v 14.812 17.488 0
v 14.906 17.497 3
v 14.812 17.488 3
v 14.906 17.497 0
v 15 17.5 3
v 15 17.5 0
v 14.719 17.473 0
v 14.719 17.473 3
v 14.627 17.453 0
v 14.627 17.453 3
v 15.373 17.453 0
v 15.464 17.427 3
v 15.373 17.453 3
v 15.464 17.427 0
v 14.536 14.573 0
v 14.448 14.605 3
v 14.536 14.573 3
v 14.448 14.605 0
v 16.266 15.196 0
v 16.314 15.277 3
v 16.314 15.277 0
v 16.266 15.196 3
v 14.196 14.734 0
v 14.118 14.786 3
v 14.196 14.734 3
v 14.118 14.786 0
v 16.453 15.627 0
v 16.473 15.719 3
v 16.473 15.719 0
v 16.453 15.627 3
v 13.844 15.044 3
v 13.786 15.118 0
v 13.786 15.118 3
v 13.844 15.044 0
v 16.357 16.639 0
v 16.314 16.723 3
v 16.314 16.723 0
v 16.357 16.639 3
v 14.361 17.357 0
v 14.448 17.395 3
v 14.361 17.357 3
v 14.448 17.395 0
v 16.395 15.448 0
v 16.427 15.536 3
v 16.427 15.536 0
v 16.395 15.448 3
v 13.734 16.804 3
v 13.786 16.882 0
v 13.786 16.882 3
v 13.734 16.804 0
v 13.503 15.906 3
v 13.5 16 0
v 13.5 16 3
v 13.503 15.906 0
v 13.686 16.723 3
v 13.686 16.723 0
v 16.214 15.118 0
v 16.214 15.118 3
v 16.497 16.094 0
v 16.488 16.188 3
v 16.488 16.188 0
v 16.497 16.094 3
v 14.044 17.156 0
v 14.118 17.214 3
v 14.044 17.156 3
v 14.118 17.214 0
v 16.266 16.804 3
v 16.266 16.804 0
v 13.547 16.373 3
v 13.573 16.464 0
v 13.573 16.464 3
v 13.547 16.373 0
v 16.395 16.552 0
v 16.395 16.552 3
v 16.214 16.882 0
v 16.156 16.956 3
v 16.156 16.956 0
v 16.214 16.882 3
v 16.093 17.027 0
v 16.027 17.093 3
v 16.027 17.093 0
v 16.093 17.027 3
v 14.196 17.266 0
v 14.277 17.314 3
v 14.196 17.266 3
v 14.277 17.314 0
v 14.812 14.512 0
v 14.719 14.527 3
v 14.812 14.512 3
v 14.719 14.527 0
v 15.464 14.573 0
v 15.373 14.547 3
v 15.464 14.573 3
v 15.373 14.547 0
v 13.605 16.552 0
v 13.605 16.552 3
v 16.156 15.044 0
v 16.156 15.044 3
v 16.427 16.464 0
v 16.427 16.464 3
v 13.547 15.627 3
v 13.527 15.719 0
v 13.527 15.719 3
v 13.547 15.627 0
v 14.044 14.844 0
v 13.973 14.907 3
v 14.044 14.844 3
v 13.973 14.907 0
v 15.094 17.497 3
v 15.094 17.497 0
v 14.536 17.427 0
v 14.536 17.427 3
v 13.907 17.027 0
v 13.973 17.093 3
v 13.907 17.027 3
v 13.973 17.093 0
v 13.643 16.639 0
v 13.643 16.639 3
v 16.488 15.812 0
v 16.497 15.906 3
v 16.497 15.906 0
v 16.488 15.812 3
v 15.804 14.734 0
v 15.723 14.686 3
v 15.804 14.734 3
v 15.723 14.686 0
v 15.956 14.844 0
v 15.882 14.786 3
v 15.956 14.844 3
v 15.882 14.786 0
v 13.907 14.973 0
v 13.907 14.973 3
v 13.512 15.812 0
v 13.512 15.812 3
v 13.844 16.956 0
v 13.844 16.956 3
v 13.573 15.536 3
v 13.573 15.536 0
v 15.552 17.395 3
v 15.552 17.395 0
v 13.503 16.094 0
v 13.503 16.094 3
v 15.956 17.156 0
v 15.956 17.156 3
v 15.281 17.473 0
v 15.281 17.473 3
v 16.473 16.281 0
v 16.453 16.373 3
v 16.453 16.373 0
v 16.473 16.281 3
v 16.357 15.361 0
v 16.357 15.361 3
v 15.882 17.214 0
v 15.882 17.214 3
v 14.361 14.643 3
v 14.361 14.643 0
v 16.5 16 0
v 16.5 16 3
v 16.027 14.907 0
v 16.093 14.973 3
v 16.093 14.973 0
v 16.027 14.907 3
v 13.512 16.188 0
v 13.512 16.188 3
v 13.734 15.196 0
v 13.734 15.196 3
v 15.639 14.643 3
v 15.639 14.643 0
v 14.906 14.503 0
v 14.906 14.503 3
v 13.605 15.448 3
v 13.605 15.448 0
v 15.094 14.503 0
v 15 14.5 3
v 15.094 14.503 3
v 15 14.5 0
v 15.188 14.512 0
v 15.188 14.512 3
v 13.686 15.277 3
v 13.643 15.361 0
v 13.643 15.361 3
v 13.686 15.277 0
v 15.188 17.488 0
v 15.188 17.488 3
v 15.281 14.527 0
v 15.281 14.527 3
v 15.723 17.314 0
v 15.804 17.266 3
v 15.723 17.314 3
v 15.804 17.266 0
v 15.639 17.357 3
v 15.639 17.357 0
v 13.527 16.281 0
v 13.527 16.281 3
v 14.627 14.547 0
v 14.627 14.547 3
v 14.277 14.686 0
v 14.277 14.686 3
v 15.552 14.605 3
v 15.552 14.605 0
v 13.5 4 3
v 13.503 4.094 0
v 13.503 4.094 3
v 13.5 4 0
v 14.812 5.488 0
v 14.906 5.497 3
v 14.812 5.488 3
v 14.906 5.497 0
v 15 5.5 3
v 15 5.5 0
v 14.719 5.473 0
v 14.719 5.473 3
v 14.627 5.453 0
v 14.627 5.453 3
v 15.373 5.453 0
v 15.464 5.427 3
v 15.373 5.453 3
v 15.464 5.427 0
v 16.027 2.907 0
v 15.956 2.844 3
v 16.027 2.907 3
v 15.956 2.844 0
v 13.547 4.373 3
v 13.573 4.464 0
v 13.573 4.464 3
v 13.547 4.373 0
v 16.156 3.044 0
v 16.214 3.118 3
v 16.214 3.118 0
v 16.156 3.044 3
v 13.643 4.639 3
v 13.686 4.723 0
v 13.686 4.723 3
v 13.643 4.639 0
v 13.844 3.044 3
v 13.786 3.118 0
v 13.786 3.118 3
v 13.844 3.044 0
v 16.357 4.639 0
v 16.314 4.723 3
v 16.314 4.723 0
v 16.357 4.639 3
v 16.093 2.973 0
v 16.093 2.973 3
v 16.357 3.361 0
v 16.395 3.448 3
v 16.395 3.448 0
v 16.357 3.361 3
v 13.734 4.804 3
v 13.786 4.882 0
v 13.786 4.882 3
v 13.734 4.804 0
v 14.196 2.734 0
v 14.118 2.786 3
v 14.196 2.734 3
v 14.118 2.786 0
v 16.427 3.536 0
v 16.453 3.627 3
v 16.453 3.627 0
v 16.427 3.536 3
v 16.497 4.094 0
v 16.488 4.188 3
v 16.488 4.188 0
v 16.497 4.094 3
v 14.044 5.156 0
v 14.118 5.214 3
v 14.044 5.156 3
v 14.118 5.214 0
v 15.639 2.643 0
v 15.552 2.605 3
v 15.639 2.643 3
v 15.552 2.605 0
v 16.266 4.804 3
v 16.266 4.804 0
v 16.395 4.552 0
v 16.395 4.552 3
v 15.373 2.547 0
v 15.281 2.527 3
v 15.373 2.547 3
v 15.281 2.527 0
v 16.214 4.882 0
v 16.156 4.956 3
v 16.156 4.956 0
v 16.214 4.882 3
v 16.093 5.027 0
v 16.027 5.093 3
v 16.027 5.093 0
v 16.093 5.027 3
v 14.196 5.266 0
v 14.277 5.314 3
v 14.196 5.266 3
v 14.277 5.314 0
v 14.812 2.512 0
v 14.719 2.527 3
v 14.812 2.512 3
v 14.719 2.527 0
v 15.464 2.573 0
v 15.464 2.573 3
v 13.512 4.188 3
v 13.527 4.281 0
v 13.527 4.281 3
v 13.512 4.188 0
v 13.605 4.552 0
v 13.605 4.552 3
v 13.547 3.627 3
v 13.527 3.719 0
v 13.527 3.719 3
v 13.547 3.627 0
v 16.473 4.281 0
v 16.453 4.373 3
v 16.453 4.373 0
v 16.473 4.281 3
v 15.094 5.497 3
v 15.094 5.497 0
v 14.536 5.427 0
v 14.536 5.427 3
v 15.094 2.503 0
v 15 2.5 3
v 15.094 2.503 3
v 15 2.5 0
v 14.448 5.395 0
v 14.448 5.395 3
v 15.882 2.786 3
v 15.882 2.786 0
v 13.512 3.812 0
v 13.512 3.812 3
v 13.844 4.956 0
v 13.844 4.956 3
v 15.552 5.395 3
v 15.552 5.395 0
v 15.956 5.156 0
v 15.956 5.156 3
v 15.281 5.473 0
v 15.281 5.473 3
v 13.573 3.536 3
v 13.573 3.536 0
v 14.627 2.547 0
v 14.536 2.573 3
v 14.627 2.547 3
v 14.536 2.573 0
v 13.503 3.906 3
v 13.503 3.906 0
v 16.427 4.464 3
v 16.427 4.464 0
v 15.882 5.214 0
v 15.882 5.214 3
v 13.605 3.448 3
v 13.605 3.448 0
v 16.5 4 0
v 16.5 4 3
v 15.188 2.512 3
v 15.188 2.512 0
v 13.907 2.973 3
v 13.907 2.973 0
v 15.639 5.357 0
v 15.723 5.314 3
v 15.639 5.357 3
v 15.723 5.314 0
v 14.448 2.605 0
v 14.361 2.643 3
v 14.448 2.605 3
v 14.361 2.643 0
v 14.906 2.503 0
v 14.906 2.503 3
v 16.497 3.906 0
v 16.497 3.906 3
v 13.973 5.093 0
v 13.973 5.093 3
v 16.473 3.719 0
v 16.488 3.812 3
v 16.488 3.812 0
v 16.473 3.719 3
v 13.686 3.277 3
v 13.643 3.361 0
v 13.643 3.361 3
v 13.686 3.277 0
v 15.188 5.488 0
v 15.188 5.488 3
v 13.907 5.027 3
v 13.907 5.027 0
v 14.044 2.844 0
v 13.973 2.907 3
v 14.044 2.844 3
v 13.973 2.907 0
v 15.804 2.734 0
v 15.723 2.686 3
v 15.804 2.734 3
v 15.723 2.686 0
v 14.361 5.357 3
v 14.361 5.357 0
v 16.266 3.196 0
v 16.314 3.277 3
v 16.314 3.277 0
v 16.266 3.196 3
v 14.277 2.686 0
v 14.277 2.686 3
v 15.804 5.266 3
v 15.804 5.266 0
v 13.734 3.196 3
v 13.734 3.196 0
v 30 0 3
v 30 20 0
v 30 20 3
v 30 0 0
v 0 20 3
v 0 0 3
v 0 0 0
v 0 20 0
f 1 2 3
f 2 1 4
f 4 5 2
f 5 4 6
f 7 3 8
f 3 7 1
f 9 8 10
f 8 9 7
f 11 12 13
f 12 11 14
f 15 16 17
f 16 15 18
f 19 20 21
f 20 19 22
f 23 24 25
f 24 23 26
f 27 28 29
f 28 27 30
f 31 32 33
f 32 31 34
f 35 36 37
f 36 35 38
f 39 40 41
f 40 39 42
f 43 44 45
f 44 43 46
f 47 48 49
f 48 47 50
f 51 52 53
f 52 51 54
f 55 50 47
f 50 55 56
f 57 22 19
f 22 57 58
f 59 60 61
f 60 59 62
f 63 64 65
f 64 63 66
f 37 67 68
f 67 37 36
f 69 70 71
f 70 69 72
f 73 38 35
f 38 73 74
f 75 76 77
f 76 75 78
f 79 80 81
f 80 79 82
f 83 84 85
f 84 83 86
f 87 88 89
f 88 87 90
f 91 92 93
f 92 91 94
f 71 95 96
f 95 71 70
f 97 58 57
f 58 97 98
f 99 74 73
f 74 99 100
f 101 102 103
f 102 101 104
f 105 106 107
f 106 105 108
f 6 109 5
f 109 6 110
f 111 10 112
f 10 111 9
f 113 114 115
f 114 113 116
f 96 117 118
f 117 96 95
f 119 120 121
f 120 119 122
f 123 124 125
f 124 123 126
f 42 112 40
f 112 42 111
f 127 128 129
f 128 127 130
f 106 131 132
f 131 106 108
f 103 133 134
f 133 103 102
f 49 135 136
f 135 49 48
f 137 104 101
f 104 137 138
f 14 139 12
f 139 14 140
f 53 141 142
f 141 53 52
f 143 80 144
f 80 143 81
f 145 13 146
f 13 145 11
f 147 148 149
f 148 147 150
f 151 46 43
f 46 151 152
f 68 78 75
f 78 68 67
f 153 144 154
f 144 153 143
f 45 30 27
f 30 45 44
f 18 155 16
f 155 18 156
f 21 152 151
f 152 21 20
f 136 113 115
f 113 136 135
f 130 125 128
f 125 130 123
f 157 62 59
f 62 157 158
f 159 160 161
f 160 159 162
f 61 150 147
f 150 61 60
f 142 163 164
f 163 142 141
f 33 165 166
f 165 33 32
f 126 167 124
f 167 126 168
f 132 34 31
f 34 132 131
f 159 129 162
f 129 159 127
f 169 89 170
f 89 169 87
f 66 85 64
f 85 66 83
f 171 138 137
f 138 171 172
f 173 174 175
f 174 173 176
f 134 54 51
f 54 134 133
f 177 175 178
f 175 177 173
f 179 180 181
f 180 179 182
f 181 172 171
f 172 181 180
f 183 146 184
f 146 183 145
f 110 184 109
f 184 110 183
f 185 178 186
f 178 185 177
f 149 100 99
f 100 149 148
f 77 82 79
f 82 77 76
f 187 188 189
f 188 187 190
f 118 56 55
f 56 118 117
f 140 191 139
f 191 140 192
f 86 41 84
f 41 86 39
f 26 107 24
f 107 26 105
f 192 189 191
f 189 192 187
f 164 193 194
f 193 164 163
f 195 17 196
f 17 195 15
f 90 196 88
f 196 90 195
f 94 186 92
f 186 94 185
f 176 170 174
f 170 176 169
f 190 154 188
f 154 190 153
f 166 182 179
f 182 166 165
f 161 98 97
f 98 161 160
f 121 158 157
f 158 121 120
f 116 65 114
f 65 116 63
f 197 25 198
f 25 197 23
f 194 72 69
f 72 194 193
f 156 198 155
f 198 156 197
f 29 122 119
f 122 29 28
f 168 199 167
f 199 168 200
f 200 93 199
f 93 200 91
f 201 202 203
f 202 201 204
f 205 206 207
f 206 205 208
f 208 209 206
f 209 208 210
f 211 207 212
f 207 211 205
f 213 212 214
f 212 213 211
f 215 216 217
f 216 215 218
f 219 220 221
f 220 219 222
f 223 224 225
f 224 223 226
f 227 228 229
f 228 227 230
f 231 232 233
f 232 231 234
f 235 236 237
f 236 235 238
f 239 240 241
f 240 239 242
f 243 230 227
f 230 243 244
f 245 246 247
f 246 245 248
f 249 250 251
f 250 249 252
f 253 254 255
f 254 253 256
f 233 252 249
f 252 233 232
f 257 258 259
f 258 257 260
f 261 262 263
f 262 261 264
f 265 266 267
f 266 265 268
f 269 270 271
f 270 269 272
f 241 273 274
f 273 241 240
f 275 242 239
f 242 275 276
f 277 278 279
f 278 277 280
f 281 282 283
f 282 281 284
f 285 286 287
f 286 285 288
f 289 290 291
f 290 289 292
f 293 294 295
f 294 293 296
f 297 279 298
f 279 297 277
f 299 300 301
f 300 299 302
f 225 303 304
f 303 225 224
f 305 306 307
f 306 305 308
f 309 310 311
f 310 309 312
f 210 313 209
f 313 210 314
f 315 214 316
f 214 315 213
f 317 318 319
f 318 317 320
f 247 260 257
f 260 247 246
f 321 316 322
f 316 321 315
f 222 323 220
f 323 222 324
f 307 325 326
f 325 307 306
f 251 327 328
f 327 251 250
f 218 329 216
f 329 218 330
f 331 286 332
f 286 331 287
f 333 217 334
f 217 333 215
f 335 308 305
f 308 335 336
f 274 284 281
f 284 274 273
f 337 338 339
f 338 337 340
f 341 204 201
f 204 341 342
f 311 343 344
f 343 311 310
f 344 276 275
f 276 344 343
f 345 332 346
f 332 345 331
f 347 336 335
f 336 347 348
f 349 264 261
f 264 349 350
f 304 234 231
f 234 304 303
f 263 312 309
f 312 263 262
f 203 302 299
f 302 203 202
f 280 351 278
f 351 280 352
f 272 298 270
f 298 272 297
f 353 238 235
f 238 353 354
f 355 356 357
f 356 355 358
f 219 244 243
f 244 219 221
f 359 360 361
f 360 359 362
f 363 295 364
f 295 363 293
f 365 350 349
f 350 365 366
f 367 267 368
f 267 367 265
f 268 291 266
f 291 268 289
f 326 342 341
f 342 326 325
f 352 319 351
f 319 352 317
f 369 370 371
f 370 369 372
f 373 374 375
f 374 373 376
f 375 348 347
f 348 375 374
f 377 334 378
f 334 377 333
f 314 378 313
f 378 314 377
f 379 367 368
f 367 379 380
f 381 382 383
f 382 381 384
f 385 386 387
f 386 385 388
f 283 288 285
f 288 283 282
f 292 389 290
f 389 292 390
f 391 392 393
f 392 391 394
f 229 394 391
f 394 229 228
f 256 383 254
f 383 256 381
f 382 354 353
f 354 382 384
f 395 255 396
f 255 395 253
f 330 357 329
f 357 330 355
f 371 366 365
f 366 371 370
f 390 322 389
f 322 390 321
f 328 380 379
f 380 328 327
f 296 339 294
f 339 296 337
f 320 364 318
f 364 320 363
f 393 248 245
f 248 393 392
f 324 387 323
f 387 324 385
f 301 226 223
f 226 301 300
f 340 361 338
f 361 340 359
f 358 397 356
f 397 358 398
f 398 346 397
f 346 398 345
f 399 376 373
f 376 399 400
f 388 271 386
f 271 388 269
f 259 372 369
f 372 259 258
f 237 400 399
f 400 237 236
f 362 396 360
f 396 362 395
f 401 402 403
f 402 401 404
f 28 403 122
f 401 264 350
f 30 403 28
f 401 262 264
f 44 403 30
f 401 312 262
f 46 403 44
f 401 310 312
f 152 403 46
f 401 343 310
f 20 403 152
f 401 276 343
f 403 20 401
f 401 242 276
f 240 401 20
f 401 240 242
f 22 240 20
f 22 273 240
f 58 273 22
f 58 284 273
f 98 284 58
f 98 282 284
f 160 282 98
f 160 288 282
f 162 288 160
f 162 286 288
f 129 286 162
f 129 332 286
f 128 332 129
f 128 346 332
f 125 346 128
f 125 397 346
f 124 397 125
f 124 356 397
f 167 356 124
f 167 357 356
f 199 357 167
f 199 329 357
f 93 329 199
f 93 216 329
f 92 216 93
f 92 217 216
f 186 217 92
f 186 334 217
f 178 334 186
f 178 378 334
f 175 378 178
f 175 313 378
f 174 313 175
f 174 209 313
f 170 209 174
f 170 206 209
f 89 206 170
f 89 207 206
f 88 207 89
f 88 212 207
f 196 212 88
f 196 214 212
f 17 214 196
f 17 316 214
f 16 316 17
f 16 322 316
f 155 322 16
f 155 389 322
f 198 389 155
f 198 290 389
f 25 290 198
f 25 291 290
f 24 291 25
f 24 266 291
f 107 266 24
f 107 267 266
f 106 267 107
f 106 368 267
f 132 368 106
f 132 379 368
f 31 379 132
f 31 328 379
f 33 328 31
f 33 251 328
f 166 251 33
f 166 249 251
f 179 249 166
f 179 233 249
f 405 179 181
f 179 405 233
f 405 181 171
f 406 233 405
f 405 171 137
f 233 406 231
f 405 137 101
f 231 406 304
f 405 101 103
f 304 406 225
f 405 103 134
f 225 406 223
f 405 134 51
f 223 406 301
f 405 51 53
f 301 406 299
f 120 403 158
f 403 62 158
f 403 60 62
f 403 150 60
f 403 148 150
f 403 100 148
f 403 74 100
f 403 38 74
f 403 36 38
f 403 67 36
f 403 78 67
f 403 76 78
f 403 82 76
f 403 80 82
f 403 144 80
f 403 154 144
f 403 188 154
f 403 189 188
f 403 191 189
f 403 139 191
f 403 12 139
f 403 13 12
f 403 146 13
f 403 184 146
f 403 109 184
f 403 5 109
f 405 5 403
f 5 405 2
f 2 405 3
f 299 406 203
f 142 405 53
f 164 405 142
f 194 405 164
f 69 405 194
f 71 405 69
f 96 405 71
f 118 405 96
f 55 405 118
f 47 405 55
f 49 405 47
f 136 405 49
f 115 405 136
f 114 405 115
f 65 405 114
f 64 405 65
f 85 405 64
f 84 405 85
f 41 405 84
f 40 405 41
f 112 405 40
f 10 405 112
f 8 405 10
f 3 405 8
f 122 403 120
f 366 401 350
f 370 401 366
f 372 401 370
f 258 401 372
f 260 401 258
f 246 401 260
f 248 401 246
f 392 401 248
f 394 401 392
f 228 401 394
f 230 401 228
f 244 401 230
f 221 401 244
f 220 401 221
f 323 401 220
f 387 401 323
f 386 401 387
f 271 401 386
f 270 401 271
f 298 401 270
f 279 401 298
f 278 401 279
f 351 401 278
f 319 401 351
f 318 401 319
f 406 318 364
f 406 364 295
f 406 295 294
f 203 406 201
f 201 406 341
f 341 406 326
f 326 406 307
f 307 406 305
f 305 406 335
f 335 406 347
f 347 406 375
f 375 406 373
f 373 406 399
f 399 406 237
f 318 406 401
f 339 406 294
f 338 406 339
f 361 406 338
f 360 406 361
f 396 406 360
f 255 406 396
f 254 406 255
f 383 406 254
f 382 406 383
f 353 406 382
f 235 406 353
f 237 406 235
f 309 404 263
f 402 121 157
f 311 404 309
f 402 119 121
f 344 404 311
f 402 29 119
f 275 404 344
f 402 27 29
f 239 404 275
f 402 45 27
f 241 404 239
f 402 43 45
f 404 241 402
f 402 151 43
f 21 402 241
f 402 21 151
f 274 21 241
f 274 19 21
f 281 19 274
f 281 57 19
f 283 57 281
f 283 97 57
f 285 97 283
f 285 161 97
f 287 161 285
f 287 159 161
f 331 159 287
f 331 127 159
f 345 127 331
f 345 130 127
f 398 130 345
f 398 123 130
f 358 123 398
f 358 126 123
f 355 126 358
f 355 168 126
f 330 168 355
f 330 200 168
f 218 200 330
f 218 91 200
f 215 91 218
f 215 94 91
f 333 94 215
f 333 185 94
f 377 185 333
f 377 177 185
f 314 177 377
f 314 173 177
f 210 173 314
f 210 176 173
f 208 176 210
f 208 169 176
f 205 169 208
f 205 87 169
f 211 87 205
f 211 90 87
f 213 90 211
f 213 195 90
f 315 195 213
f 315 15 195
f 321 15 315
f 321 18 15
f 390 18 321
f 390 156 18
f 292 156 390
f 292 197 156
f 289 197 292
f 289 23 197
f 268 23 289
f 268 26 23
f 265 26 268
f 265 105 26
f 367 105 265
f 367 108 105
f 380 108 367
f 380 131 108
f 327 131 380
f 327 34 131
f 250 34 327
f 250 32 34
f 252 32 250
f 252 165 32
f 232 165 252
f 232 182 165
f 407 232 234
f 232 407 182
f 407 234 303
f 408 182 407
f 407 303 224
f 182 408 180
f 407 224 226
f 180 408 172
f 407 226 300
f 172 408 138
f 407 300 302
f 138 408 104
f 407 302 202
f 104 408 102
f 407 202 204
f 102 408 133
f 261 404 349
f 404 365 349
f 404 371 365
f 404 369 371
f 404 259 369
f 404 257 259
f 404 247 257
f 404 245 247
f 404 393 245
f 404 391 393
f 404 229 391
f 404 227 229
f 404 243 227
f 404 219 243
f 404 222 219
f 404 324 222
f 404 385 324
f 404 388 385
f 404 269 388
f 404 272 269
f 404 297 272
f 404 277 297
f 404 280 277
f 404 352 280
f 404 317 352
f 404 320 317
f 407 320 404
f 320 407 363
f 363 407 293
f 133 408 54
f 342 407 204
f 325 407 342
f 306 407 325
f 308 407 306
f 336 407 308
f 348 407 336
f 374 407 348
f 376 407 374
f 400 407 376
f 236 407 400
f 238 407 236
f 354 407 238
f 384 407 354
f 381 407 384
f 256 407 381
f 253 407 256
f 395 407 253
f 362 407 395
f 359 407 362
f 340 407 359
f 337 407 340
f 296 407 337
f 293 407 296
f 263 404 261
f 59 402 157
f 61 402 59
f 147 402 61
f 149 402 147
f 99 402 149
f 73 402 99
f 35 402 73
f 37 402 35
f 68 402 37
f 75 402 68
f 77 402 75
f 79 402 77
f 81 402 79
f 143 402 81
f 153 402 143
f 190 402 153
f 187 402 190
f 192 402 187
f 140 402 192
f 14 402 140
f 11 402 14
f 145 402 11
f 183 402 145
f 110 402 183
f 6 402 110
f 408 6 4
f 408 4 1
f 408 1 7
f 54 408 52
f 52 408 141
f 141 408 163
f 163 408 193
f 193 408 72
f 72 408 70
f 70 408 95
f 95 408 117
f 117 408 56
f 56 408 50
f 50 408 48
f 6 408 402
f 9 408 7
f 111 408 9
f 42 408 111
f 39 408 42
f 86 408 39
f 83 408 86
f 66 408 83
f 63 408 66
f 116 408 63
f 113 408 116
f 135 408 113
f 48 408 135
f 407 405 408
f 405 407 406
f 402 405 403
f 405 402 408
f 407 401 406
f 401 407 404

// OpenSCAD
difference(){
	union(){ 

        translate([0,0,0]){
           cube([30,20,3], center=false);
        }                
	}
	union() {
        translate([15,16,0]){
            rotate([0,0,90]){
                cylinder(h=200, r=1.5, $fn=100, center=true);
            }   
        }
        translate([15,4,0]){
            rotate([0,0,90]){
                cylinder(h=200, r=1.5, $fn=100, center=true);
            }   
        }

	}
}
